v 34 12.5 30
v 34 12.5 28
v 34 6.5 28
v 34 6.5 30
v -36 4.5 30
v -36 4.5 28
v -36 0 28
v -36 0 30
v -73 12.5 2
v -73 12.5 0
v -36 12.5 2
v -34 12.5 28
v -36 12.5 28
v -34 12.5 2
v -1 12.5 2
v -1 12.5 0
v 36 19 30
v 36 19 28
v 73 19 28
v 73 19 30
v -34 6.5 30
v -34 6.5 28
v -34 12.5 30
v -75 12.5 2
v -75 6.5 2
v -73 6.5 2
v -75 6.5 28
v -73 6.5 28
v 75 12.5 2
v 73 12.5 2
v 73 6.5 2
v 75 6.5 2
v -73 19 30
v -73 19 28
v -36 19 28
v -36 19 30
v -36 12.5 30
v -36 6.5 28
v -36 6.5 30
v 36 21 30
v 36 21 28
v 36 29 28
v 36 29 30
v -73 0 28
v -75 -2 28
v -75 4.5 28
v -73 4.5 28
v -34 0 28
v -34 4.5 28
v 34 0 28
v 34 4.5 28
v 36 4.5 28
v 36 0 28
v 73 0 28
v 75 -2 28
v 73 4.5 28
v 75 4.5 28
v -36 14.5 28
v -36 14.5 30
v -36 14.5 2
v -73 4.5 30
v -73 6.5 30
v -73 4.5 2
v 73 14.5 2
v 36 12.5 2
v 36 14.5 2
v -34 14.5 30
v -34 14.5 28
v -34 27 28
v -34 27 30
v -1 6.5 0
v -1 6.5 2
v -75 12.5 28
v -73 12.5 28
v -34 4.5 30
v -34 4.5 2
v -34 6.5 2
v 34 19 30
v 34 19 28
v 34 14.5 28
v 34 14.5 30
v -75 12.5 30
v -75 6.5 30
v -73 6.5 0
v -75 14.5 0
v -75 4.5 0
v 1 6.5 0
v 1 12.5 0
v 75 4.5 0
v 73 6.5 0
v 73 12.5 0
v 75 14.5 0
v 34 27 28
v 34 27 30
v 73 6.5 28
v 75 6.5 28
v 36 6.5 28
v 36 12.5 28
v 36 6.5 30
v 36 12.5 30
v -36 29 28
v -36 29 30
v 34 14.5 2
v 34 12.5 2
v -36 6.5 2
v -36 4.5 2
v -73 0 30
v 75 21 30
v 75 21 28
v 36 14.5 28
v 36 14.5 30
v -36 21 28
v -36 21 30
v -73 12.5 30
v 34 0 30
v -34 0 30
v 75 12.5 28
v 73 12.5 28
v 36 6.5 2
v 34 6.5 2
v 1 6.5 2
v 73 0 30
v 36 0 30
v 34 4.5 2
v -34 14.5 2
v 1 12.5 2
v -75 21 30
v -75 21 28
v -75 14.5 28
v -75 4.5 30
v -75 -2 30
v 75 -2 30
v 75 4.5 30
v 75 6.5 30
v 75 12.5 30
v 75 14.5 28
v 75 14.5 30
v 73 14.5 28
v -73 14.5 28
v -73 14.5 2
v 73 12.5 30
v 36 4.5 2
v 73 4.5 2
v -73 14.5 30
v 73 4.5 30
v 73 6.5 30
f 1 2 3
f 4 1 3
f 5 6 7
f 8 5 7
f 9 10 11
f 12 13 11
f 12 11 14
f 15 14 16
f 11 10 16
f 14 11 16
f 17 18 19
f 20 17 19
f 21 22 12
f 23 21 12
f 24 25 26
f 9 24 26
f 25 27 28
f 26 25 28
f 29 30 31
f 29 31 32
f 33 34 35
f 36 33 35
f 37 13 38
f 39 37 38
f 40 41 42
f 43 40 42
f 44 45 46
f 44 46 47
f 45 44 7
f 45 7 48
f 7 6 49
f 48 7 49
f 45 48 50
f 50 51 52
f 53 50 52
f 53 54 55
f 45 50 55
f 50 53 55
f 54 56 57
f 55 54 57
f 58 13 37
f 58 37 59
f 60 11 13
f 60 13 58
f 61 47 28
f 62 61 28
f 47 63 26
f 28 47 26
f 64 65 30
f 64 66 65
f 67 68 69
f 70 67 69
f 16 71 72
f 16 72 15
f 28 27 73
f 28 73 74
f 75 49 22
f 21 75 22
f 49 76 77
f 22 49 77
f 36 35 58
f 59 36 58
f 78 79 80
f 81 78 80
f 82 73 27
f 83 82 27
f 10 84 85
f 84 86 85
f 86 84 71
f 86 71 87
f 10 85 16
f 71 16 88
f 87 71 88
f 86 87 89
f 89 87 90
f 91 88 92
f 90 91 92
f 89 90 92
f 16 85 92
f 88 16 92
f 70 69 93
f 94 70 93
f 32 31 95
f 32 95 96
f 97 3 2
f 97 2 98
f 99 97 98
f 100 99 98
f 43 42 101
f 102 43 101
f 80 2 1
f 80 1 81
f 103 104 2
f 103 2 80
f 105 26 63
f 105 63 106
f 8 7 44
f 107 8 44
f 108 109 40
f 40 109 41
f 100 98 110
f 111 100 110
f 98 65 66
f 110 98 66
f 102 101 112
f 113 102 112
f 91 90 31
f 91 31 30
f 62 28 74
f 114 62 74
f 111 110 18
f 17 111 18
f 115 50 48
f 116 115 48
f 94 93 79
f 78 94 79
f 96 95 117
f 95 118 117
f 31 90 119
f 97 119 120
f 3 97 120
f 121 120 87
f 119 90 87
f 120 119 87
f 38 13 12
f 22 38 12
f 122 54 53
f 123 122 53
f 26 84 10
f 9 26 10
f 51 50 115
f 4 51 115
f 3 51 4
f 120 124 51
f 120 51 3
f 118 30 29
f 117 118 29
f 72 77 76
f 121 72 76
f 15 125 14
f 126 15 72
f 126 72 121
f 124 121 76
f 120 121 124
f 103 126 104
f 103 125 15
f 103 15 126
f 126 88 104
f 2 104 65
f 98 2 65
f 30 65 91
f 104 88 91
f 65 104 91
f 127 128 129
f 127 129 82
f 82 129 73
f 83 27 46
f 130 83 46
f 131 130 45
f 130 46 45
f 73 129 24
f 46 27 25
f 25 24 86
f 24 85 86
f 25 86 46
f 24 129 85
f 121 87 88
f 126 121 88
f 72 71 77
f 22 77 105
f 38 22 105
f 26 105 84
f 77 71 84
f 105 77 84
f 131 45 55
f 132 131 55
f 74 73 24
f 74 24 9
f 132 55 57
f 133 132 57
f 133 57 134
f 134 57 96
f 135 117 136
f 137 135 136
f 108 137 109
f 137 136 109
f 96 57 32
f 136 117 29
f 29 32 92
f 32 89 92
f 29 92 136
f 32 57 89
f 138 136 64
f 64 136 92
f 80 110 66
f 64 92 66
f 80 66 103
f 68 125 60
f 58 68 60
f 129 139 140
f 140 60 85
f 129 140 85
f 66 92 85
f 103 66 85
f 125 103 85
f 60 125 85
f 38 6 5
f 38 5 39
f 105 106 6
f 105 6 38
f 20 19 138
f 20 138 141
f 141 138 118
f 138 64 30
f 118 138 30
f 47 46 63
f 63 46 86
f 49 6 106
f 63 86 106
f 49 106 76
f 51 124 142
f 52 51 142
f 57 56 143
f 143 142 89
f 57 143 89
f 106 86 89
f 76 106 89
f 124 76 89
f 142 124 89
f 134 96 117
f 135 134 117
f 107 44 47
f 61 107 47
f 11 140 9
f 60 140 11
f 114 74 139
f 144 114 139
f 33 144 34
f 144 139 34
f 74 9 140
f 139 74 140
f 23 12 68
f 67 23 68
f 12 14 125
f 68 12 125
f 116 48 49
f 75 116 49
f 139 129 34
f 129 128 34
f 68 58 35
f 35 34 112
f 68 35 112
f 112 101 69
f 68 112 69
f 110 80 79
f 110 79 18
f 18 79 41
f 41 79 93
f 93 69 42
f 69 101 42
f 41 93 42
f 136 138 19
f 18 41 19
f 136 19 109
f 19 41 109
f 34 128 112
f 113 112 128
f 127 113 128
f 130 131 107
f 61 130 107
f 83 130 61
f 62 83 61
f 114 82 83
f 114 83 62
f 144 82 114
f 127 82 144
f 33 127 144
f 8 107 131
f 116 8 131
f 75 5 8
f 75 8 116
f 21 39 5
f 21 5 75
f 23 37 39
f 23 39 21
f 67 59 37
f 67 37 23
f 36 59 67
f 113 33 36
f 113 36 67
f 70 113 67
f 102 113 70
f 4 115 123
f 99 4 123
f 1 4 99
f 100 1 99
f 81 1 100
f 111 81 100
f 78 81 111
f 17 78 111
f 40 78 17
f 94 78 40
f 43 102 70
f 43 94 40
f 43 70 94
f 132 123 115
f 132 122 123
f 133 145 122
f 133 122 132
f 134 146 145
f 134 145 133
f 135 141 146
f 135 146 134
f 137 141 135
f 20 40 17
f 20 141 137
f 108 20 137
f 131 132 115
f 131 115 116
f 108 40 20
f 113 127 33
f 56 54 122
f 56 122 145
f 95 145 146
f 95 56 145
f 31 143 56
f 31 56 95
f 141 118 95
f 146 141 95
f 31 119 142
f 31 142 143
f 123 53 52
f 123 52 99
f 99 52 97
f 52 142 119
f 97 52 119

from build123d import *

# Parameters (mm, degrees)
F0_W     = 1.9999997169
F0_H     = 2
F0_H_2   = 6
F0_W_2   = 37.0000002831
F0_W_3   = 2
F1_DEPTH = 2
F2_DEPTH = 30
F3_START = 28
F0_H_3   = 4.5
F3_DEPTH = 2


with BuildPart() as f1:
    # F0 (on Top) → F1 (new body)
    with BuildSketch(Plane.XY):
        with Locations((-73.9999998584, 13.5)):
            Rectangle(F0_W, F0_H)
        with Locations((-73.9999998584, 9.5)):
            Rectangle(F0_W, F0_H_2)
        with Locations((-73.9999998584, 5.5)):
            Rectangle(F0_W, F0_H)
        with Locations((-54.4999998584, 5.5)):
            Rectangle(F0_W_2, F0_H)
        with Locations((-54.4999998584, 13.5)):
            Rectangle(F0_W_2, F0_H)
        with Locations((-34.9999998584, 13.5)):
            Rectangle(F0_W, F0_H)
        Polygon((-34, 14.5), (-34, 12.5), (-1, 12.5), (1, 12.5), (34, 12.5), (34, 14.5), align=None)
        with Locations((-34.9999998584, 5.5)):
            Rectangle(F0_W, F0_H)
        Polygon((-34, 6.5), (-34, 4.5), (34, 4.5), (34, 6.5), (1, 6.5), (-1, 6.5), align=None)
        with Locations((0, 9.5)):
            Rectangle(F0_W_3, F0_H_2)
        with Locations((34.9999998584, 13.5)):
            Rectangle(F0_W, F0_H)
        with Locations((34.9999998584, 5.5)):
            Rectangle(F0_W, F0_H)
        with Locations((54.4999998584, 5.5)):
            Rectangle(F0_W_2, F0_H)
        with Locations((54.4999998584, 13.5)):
            Rectangle(F0_W_2, F0_H)
        with Locations((73.9999998584, 13.5)):
            Rectangle(F0_W, F0_H)
        with Locations((73.9999998584, 9.5)):
            Rectangle(F0_W, F0_H_2)
        with Locations((73.9999998584, 5.5)):
            Rectangle(F0_W, F0_H)
    extrude(amount=F1_DEPTH)

    # F0 (on Top) → F2 (join)
    with BuildSketch(Plane.XY):
        with Locations((-73.9999998584, 5.5)):
            Rectangle(F0_W, F0_H)
        with Locations((-73.9999998584, 13.5)):
            Rectangle(F0_W, F0_H)
        with Locations((-34.9999998584, 5.5)):
            Rectangle(F0_W, F0_H)
        with Locations((-34.9999998584, 13.5)):
            Rectangle(F0_W, F0_H)
        with Locations((34.9999998584, 5.5)):
            Rectangle(F0_W, F0_H)
        with Locations((34.9999998584, 13.5)):
            Rectangle(F0_W, F0_H)
        with Locations((73.9999998584, 5.5)):
            Rectangle(F0_W, F0_H)
        with Locations((73.9999998584, 13.5)):
            Rectangle(F0_W, F0_H)
    extrude(amount=F2_DEPTH)

    # F0 (on Top) → F3 (join)
    with BuildSketch(Plane.XY.offset(F3_START)):
        Polygon((-74.9999997169, 14.5), (-73, 14.5), (-73, 19), (-35.9999997169, 19), (-35.9999997169, 20.9999997169), (-74.9999997169, 20.9999997169), align=None)
        Polygon((-35.9999997169, 0), (-73, 0), (-73, 4.5), (-74.9999997169, 4.5), (-74.9999997169, -1.9999997169), (74.9999997169, -1.9999997169), (74.9999997169, 4.5), (73, 4.5), (73, 0), (35.9999997169, 0), (34, 0), (-34, 0), align=None)
        with Locations((-34.9999998584, 2.25)):
            Rectangle(F0_W, F0_H_3)
        with Locations((-34.9999998584, 9.5)):
            Rectangle(F0_W, F0_H_2)
        with Locations((-34.9999998584, 16.75)):
            Rectangle(F0_W, F0_H_3)
        Polygon((-35.9999997169, 20.9999997169), (-35.9999997169, 19), (-34, 19), (-34, 27), (34, 27), (34, 19), (35.9999997169, 19), (35.9999997169, 20.9999997169), (35.9999997169, 28.9999997169), (-35.9999997169, 28.9999997169), align=None)
        with Locations((34.9999998584, 16.75)):
            Rectangle(F0_W, F0_H_3)
        Polygon((73, 14.5), (74.9999997169, 14.5), (74.9999997169, 20.9999997169), (35.9999997169, 20.9999997169), (35.9999997169, 19), (73, 19), align=None)
        with Locations((34.9999998584, 9.5)):
            Rectangle(F0_W, F0_H_2)
        with Locations((34.9999998584, 2.25)):
            Rectangle(F0_W, F0_H_3)
        with Locations((-34.9999998584, 5.5)):
            Rectangle(F0_W, F0_H)
        with Locations((-73.9999998584, 5.5)):
            Rectangle(F0_W, F0_H)
        with Locations((-73.9999998584, 9.5)):
            Rectangle(F0_W, F0_H_2)
        with Locations((-73.9999998584, 13.5)):
            Rectangle(F0_W, F0_H)
        with Locations((-34.9999998584, 13.5)):
            Rectangle(F0_W, F0_H)
        with Locations((34.9999998584, 13.5)):
            Rectangle(F0_W, F0_H)
        with Locations((34.9999998584, 5.5)):
            Rectangle(F0_W, F0_H)
        with Locations((73.9999998584, 5.5)):
            Rectangle(F0_W, F0_H)
        with Locations((73.9999998584, 9.5)):
            Rectangle(F0_W, F0_H_2)
        with Locations((73.9999998584, 13.5)):
            Rectangle(F0_W, F0_H)
    extrude(amount=F3_DEPTH)


solid = f1.part
